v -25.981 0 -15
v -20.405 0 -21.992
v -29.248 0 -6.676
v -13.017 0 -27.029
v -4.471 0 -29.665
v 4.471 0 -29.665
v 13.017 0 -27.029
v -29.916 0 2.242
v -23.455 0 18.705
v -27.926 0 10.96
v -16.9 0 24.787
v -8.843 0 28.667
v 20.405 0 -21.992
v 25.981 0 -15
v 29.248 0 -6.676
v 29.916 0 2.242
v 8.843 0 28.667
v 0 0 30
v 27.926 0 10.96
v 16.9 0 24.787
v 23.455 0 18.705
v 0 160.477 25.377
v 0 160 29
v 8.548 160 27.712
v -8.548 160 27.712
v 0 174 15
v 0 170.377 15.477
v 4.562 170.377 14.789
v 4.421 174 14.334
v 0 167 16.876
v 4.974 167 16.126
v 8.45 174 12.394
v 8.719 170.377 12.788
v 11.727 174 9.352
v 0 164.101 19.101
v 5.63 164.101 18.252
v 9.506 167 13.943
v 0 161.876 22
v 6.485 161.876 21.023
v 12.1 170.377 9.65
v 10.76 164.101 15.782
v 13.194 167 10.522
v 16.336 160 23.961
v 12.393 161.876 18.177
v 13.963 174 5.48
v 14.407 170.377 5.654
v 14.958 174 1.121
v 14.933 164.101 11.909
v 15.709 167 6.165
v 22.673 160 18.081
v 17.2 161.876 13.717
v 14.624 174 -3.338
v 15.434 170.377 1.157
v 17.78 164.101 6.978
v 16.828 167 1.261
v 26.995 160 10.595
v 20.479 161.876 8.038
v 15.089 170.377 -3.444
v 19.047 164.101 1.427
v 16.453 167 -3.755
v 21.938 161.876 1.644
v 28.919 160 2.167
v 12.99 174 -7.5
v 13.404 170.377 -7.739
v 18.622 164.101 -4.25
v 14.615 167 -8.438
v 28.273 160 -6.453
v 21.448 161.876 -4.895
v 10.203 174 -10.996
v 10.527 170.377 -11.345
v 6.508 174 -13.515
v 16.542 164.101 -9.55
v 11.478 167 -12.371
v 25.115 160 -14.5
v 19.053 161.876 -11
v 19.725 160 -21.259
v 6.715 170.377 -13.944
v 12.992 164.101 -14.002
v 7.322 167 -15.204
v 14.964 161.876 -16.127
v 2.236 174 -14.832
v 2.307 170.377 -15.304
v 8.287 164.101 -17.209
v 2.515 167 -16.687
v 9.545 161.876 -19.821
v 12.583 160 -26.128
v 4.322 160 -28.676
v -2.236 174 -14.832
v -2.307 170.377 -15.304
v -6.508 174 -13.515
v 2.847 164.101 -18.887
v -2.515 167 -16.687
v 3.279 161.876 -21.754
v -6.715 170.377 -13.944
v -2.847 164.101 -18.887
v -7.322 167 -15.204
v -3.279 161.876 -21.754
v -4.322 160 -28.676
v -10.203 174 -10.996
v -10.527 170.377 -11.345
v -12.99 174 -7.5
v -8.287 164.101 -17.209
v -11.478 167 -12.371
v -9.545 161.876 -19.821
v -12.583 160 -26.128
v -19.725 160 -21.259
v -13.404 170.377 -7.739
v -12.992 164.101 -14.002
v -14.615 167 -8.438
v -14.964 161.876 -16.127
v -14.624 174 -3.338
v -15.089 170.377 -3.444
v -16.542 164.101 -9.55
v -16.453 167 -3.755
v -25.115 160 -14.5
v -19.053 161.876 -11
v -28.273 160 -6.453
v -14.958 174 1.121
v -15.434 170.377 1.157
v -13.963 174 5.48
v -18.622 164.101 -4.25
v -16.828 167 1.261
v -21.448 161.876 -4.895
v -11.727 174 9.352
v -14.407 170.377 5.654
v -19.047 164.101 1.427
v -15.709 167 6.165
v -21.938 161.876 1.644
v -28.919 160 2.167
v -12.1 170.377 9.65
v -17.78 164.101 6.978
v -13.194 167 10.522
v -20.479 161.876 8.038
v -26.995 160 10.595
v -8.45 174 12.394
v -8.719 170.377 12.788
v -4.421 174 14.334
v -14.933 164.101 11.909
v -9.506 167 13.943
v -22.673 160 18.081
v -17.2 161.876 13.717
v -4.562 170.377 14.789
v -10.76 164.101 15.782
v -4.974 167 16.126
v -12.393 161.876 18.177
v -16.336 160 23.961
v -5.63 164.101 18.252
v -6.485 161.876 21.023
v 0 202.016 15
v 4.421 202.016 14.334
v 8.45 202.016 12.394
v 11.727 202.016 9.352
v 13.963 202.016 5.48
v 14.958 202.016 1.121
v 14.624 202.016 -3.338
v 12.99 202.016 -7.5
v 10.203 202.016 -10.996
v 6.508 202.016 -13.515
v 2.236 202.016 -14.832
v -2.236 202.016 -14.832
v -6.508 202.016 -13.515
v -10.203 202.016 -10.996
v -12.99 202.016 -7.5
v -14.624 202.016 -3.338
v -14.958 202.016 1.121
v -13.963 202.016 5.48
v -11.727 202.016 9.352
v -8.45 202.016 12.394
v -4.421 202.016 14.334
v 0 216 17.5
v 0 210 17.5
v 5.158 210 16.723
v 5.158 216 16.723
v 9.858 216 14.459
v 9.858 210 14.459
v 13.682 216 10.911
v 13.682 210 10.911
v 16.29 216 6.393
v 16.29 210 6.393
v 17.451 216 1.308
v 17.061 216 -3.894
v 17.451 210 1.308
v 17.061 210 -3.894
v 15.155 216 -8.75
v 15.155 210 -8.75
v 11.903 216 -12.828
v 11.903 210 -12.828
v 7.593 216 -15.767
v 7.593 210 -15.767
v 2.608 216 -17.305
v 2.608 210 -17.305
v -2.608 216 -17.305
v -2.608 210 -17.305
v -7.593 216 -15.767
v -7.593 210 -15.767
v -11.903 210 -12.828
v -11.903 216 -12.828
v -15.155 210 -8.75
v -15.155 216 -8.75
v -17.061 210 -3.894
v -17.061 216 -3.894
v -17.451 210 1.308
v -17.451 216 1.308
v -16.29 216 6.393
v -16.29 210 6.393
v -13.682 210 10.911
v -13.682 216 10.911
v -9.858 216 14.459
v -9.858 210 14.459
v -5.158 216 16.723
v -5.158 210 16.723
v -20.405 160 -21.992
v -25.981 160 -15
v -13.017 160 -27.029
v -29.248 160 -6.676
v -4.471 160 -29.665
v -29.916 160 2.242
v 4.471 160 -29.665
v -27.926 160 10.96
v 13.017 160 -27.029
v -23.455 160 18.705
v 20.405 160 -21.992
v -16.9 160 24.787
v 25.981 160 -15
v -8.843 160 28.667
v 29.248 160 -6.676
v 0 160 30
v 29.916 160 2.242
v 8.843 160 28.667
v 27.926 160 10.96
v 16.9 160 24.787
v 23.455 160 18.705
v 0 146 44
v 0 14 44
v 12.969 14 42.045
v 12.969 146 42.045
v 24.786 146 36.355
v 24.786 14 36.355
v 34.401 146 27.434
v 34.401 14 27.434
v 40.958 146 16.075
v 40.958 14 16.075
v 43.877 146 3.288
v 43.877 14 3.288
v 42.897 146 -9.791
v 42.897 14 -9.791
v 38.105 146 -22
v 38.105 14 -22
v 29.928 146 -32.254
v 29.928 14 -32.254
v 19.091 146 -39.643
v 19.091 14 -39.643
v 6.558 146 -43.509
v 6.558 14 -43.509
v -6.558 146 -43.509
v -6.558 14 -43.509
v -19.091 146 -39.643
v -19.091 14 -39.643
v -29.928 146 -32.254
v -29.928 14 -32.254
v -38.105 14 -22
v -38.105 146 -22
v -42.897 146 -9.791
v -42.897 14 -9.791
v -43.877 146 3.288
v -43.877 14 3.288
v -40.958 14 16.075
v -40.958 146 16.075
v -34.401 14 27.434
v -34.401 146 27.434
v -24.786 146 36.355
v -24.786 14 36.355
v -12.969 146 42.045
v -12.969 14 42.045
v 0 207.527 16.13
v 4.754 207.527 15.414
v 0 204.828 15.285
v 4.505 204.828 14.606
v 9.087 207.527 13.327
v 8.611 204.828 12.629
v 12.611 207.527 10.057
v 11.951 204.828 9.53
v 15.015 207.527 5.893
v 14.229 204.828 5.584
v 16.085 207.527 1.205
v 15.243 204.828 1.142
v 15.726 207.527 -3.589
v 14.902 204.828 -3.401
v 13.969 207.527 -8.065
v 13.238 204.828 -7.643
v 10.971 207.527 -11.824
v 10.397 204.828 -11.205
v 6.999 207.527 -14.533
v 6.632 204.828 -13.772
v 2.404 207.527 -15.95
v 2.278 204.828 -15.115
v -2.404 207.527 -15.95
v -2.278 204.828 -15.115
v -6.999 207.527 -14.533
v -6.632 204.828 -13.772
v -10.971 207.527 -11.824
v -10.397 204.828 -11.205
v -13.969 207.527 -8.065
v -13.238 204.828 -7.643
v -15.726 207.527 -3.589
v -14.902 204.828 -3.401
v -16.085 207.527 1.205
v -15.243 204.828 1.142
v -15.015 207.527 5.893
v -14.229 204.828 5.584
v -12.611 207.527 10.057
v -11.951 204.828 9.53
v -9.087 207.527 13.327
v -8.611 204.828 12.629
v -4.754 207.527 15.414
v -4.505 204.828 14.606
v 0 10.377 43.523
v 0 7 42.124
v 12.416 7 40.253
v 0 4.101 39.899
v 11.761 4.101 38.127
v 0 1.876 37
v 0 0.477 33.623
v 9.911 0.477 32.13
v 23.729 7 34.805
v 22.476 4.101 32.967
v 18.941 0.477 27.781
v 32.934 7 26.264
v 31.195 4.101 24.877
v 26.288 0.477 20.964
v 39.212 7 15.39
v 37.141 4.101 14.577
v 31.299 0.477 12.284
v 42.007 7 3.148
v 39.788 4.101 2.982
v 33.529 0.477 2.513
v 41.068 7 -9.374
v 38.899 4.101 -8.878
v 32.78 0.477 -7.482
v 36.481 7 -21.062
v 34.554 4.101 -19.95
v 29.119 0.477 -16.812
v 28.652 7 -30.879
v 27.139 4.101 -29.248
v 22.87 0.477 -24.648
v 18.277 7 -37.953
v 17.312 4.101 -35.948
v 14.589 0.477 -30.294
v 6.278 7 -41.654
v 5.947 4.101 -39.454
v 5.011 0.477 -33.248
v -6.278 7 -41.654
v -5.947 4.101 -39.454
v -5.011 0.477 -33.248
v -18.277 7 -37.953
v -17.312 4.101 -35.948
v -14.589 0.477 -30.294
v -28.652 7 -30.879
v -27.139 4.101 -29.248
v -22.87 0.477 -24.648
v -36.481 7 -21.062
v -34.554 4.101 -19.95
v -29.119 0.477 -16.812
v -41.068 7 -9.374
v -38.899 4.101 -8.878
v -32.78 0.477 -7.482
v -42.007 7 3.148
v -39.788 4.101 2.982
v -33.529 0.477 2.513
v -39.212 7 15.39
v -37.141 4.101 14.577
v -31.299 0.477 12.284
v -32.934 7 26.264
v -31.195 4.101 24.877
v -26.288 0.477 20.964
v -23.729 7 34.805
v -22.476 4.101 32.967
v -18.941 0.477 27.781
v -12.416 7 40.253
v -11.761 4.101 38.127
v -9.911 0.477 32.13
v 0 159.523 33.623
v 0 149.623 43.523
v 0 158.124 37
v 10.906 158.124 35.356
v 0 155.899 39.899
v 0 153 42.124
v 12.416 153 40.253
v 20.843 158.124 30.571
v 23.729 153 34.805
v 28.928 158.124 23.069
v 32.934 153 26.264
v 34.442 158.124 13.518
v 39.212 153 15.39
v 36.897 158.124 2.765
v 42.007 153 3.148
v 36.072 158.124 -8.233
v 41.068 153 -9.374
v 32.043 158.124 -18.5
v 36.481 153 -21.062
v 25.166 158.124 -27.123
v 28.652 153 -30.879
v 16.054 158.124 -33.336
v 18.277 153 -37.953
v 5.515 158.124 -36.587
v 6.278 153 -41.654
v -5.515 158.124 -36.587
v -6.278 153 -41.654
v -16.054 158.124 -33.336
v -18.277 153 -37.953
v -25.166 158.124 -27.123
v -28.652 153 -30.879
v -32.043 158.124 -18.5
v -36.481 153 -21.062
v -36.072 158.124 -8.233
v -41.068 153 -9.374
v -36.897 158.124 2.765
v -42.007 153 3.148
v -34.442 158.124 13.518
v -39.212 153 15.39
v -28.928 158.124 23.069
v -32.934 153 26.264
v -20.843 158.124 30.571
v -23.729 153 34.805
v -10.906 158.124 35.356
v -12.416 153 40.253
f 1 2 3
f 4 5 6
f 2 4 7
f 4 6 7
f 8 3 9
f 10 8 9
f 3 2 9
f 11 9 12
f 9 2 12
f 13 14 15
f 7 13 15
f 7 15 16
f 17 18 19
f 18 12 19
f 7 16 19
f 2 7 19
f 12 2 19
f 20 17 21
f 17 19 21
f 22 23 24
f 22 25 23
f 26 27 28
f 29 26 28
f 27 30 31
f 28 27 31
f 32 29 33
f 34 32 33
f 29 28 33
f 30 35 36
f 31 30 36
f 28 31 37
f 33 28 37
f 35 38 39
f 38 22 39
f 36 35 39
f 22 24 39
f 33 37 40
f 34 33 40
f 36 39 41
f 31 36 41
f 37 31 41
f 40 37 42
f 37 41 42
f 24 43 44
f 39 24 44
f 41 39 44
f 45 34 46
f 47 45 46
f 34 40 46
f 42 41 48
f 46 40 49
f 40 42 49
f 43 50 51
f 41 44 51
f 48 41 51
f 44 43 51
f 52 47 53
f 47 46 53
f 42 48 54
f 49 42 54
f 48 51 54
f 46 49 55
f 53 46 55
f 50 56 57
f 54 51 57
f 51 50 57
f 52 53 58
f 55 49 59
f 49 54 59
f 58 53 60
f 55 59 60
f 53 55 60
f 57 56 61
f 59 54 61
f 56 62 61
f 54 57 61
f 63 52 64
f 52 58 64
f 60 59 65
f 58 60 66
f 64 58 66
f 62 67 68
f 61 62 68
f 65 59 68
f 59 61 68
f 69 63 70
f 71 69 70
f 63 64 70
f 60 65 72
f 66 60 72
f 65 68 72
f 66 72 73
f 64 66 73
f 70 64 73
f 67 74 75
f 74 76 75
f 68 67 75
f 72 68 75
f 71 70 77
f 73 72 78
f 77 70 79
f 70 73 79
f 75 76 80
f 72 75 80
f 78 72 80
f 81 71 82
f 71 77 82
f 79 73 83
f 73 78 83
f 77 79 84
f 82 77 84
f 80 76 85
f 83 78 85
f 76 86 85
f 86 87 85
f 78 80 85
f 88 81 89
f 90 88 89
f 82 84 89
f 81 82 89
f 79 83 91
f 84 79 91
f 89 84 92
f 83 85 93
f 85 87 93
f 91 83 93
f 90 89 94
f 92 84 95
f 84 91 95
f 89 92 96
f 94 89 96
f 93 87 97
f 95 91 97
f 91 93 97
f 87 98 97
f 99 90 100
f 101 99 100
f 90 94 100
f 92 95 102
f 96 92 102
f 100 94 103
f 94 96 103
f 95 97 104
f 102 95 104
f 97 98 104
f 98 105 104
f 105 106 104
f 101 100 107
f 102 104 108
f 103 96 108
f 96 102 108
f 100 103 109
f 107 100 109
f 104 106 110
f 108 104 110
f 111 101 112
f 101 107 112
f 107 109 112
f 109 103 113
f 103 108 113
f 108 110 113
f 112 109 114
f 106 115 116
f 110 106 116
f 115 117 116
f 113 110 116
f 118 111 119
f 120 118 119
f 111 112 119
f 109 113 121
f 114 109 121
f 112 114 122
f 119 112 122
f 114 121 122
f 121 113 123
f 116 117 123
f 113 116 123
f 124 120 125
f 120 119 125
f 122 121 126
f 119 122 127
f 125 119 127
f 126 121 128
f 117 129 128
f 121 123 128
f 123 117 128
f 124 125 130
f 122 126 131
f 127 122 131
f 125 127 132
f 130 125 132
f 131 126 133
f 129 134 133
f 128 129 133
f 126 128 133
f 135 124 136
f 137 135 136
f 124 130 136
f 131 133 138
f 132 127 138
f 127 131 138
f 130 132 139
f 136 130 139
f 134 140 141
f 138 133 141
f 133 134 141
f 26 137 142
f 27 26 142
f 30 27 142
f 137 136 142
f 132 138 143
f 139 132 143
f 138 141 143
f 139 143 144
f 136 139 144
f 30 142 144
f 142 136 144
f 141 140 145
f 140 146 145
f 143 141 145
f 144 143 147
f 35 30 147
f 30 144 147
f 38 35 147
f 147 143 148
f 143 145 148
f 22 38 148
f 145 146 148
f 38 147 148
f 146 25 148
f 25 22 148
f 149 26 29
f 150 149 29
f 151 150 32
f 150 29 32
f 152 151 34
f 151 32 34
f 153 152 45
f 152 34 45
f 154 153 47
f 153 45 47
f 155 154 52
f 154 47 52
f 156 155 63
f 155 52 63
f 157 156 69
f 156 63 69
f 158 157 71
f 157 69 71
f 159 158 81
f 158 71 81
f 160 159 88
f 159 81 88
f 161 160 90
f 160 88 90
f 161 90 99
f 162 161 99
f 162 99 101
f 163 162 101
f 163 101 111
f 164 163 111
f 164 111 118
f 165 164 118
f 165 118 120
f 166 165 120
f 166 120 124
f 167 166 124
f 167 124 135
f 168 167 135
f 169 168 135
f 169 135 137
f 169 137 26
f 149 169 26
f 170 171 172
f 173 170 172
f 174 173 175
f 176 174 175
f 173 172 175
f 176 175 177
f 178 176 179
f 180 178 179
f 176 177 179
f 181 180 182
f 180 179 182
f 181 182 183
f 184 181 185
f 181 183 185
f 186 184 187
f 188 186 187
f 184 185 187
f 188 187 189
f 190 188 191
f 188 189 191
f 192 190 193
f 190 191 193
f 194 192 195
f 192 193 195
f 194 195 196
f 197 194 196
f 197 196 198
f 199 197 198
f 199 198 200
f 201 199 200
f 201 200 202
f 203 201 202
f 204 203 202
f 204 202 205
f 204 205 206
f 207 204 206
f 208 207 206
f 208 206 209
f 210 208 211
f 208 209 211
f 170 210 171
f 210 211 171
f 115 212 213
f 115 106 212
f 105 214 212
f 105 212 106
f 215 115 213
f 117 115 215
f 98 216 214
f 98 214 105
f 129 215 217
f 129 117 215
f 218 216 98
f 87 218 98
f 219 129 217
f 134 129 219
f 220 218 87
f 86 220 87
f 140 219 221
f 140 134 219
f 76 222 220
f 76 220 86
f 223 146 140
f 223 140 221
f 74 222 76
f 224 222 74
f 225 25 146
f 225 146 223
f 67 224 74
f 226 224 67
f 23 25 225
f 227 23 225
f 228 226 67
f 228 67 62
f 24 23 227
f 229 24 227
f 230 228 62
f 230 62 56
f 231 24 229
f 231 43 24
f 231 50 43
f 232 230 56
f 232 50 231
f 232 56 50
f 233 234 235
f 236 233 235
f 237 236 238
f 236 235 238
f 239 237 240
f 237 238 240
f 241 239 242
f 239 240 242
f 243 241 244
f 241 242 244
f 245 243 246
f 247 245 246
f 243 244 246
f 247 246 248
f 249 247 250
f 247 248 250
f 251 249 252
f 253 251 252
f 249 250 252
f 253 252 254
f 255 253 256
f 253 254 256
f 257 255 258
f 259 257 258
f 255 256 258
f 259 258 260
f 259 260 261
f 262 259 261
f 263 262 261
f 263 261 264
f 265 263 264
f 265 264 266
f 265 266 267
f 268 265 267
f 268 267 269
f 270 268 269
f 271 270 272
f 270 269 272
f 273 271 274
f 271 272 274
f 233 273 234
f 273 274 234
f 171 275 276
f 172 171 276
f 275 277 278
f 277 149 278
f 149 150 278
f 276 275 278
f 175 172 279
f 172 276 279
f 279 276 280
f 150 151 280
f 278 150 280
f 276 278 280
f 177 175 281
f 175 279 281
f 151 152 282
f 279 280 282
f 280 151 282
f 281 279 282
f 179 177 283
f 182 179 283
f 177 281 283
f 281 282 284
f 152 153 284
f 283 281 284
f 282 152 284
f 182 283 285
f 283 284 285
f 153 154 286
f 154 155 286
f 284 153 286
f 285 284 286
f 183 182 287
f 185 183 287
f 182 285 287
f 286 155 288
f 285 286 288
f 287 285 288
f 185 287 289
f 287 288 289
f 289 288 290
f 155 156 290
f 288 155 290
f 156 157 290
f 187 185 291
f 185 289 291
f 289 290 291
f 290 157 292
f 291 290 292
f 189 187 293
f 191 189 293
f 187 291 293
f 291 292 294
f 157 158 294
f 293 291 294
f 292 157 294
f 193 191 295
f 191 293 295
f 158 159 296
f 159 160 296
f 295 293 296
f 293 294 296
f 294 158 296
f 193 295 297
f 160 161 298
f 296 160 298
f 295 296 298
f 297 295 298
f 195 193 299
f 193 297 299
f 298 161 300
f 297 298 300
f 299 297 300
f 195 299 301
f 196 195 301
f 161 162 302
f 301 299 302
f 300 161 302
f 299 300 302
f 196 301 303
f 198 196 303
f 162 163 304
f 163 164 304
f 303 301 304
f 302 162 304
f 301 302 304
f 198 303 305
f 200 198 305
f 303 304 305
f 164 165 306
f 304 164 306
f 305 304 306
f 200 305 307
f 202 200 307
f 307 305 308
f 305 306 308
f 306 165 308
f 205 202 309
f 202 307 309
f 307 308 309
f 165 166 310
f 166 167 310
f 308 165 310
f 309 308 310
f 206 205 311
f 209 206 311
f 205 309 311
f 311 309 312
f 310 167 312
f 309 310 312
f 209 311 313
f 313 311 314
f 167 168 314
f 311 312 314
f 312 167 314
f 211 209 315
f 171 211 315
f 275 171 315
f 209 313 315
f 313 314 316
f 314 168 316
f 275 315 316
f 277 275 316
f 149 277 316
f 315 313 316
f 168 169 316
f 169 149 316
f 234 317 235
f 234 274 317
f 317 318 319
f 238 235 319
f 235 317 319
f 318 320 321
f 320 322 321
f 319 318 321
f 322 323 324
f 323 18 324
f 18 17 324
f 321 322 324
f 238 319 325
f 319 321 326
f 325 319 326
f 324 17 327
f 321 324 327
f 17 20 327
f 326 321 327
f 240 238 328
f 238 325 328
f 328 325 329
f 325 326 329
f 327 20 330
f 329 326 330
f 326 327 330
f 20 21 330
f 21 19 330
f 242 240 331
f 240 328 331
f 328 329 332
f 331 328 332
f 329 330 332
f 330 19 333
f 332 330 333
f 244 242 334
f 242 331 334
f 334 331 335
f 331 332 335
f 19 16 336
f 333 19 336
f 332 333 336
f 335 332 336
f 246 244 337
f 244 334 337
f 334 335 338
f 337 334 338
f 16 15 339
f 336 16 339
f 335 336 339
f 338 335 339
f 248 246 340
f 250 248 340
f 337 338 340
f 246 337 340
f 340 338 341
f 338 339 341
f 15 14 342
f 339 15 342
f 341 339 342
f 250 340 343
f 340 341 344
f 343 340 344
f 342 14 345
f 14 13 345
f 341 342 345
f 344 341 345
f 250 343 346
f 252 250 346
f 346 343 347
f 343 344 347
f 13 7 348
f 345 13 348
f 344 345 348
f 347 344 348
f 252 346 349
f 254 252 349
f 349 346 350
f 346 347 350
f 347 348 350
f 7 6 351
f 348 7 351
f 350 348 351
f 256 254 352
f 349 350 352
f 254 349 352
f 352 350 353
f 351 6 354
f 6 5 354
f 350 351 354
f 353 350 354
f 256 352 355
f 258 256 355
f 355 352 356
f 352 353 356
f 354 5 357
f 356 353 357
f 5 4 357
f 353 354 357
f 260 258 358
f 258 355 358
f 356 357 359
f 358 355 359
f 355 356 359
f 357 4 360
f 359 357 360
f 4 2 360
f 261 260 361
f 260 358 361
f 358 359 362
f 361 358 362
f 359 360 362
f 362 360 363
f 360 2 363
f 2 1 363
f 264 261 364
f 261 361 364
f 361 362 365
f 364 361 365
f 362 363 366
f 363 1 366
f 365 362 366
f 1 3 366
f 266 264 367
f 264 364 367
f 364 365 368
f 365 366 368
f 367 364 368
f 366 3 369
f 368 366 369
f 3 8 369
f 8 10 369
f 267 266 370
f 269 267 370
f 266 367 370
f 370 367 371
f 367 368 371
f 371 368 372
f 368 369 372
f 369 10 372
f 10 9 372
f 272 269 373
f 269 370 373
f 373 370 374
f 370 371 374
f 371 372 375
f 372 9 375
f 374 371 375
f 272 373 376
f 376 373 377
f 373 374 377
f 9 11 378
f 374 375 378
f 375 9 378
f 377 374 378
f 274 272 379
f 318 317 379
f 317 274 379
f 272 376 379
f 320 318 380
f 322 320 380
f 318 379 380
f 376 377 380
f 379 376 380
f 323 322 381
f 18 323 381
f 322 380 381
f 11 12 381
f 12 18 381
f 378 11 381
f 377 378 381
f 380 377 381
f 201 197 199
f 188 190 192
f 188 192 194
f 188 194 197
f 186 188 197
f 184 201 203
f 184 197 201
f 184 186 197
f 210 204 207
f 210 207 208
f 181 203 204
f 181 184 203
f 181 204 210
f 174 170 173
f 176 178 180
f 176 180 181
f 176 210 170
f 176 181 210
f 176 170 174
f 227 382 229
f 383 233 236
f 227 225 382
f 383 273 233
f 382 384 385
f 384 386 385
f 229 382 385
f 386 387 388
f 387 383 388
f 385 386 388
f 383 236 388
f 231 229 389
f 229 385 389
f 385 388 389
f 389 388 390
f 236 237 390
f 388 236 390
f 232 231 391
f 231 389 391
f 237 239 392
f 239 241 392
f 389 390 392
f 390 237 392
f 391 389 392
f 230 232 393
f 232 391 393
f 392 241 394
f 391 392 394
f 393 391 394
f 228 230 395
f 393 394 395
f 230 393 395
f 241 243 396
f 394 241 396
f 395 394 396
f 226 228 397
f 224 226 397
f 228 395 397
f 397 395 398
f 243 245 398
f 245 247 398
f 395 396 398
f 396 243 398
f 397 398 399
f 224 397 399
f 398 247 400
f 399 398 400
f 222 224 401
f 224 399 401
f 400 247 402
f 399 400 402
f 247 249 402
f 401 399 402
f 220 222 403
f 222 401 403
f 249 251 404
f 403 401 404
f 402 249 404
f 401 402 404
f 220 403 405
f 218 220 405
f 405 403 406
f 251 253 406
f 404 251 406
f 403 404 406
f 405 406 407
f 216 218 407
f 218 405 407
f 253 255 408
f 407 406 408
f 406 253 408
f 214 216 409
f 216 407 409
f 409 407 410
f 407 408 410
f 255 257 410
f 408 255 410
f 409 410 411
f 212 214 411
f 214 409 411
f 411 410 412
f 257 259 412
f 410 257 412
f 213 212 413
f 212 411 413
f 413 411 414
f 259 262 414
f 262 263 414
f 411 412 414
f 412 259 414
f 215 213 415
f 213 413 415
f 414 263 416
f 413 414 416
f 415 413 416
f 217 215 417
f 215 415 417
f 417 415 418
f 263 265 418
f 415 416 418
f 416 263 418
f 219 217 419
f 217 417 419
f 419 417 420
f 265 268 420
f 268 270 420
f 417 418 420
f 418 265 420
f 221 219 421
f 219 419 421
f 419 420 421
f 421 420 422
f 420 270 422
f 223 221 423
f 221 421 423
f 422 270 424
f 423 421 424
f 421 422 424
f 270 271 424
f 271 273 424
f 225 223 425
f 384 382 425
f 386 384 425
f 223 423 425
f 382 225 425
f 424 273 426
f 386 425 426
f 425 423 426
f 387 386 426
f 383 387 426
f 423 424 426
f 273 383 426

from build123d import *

# Parameters (mm, degrees)
ESQUISSE1_R        = 44
BOSS_EXTRU_1_DEPTH = 160
ESQUISSE2_R        = 15
BOSS_EXTRU_2_DEPTH = 50
ESQUISSE3_R        = 17.5
BOSS_EXTRU_3_DEPTH = 6
CONG_1_R           = 14
CONG_2_R           = 14
CONG_3_R           = 14


with BuildPart() as part:
    # Esquisse1 → Boss.-Extru.1 (new body)
    with BuildSketch(Plane(origin=(0, 0, 0), x_dir=(1, 0, 0), z_dir=(0, 1, 0))):
        with Locations(Location((0, 0, 0), (0, 0, 270))):
            Circle(ESQUISSE1_R)
    extrude(amount=BOSS_EXTRU_1_DEPTH)

    # Esquisse2 → Boss.-Extru.2 (add)
    with BuildSketch(Plane(origin=(0, 160, 0), x_dir=(1, 0, 0), z_dir=(0, 1, 0))):
        with Locations(Location((0, 0, 0), (0, 0, 270))):
            Circle(ESQUISSE2_R)
    extrude(amount=BOSS_EXTRU_2_DEPTH)

    # Esquisse3 → Boss.-Extru.3 (add)
    with BuildSketch(Plane(origin=(0, 210, 0), x_dir=(1, 0, 0), z_dir=(0, 1, 0))):
        with Locations(Location((0, 0, 0), (0, 0, 270))):
            Circle(ESQUISSE3_R)
    extrude(amount=BOSS_EXTRU_3_DEPTH)

    # Congé1
    cong_1_edges = [part.edges().sort_by_distance(p)[0] for p in [
        (0, 160, -44),
        (0, 160, -15),
    ]]
    fillet(cong_1_edges, radius=CONG_1_R)

    # Congé2
    # the kernel refuses this fillet: 14 mm, written as the material it adds along each edge
    with BuildSketch(Plane(origin=(0, 210, 0), x_dir=(0, 0, 1), z_dir=(-1, 0, 0))) as cong_2_piece_1:
        with BuildLine():
            CenterArc((29, -7.984359711), CONG_2_R, 145.228055968, 34.771944032)
            Line((17.5, 0), (17.27, 0.159687194))
            ThreePointArc((17.27, 0.159687194), (16.25, 0.28), (15, 0.28))
            Line((15, 0.28), (14.72, 0))
            Line((14.72, 0), (14.72, -7.984359711))
            Line((14.72, -7.984359711), (15, -7.984359711))
        make_face()
    revolve(axis=Axis((0, 210, 0), (0, 1, 0)))

    # Congé3
    cong_3_edges = [part.edges().sort_by_distance(p)[0] for p in [
        (0, 0, -44),
    ]]
    fillet(cong_3_edges, radius=CONG_3_R)


solid = part.part
